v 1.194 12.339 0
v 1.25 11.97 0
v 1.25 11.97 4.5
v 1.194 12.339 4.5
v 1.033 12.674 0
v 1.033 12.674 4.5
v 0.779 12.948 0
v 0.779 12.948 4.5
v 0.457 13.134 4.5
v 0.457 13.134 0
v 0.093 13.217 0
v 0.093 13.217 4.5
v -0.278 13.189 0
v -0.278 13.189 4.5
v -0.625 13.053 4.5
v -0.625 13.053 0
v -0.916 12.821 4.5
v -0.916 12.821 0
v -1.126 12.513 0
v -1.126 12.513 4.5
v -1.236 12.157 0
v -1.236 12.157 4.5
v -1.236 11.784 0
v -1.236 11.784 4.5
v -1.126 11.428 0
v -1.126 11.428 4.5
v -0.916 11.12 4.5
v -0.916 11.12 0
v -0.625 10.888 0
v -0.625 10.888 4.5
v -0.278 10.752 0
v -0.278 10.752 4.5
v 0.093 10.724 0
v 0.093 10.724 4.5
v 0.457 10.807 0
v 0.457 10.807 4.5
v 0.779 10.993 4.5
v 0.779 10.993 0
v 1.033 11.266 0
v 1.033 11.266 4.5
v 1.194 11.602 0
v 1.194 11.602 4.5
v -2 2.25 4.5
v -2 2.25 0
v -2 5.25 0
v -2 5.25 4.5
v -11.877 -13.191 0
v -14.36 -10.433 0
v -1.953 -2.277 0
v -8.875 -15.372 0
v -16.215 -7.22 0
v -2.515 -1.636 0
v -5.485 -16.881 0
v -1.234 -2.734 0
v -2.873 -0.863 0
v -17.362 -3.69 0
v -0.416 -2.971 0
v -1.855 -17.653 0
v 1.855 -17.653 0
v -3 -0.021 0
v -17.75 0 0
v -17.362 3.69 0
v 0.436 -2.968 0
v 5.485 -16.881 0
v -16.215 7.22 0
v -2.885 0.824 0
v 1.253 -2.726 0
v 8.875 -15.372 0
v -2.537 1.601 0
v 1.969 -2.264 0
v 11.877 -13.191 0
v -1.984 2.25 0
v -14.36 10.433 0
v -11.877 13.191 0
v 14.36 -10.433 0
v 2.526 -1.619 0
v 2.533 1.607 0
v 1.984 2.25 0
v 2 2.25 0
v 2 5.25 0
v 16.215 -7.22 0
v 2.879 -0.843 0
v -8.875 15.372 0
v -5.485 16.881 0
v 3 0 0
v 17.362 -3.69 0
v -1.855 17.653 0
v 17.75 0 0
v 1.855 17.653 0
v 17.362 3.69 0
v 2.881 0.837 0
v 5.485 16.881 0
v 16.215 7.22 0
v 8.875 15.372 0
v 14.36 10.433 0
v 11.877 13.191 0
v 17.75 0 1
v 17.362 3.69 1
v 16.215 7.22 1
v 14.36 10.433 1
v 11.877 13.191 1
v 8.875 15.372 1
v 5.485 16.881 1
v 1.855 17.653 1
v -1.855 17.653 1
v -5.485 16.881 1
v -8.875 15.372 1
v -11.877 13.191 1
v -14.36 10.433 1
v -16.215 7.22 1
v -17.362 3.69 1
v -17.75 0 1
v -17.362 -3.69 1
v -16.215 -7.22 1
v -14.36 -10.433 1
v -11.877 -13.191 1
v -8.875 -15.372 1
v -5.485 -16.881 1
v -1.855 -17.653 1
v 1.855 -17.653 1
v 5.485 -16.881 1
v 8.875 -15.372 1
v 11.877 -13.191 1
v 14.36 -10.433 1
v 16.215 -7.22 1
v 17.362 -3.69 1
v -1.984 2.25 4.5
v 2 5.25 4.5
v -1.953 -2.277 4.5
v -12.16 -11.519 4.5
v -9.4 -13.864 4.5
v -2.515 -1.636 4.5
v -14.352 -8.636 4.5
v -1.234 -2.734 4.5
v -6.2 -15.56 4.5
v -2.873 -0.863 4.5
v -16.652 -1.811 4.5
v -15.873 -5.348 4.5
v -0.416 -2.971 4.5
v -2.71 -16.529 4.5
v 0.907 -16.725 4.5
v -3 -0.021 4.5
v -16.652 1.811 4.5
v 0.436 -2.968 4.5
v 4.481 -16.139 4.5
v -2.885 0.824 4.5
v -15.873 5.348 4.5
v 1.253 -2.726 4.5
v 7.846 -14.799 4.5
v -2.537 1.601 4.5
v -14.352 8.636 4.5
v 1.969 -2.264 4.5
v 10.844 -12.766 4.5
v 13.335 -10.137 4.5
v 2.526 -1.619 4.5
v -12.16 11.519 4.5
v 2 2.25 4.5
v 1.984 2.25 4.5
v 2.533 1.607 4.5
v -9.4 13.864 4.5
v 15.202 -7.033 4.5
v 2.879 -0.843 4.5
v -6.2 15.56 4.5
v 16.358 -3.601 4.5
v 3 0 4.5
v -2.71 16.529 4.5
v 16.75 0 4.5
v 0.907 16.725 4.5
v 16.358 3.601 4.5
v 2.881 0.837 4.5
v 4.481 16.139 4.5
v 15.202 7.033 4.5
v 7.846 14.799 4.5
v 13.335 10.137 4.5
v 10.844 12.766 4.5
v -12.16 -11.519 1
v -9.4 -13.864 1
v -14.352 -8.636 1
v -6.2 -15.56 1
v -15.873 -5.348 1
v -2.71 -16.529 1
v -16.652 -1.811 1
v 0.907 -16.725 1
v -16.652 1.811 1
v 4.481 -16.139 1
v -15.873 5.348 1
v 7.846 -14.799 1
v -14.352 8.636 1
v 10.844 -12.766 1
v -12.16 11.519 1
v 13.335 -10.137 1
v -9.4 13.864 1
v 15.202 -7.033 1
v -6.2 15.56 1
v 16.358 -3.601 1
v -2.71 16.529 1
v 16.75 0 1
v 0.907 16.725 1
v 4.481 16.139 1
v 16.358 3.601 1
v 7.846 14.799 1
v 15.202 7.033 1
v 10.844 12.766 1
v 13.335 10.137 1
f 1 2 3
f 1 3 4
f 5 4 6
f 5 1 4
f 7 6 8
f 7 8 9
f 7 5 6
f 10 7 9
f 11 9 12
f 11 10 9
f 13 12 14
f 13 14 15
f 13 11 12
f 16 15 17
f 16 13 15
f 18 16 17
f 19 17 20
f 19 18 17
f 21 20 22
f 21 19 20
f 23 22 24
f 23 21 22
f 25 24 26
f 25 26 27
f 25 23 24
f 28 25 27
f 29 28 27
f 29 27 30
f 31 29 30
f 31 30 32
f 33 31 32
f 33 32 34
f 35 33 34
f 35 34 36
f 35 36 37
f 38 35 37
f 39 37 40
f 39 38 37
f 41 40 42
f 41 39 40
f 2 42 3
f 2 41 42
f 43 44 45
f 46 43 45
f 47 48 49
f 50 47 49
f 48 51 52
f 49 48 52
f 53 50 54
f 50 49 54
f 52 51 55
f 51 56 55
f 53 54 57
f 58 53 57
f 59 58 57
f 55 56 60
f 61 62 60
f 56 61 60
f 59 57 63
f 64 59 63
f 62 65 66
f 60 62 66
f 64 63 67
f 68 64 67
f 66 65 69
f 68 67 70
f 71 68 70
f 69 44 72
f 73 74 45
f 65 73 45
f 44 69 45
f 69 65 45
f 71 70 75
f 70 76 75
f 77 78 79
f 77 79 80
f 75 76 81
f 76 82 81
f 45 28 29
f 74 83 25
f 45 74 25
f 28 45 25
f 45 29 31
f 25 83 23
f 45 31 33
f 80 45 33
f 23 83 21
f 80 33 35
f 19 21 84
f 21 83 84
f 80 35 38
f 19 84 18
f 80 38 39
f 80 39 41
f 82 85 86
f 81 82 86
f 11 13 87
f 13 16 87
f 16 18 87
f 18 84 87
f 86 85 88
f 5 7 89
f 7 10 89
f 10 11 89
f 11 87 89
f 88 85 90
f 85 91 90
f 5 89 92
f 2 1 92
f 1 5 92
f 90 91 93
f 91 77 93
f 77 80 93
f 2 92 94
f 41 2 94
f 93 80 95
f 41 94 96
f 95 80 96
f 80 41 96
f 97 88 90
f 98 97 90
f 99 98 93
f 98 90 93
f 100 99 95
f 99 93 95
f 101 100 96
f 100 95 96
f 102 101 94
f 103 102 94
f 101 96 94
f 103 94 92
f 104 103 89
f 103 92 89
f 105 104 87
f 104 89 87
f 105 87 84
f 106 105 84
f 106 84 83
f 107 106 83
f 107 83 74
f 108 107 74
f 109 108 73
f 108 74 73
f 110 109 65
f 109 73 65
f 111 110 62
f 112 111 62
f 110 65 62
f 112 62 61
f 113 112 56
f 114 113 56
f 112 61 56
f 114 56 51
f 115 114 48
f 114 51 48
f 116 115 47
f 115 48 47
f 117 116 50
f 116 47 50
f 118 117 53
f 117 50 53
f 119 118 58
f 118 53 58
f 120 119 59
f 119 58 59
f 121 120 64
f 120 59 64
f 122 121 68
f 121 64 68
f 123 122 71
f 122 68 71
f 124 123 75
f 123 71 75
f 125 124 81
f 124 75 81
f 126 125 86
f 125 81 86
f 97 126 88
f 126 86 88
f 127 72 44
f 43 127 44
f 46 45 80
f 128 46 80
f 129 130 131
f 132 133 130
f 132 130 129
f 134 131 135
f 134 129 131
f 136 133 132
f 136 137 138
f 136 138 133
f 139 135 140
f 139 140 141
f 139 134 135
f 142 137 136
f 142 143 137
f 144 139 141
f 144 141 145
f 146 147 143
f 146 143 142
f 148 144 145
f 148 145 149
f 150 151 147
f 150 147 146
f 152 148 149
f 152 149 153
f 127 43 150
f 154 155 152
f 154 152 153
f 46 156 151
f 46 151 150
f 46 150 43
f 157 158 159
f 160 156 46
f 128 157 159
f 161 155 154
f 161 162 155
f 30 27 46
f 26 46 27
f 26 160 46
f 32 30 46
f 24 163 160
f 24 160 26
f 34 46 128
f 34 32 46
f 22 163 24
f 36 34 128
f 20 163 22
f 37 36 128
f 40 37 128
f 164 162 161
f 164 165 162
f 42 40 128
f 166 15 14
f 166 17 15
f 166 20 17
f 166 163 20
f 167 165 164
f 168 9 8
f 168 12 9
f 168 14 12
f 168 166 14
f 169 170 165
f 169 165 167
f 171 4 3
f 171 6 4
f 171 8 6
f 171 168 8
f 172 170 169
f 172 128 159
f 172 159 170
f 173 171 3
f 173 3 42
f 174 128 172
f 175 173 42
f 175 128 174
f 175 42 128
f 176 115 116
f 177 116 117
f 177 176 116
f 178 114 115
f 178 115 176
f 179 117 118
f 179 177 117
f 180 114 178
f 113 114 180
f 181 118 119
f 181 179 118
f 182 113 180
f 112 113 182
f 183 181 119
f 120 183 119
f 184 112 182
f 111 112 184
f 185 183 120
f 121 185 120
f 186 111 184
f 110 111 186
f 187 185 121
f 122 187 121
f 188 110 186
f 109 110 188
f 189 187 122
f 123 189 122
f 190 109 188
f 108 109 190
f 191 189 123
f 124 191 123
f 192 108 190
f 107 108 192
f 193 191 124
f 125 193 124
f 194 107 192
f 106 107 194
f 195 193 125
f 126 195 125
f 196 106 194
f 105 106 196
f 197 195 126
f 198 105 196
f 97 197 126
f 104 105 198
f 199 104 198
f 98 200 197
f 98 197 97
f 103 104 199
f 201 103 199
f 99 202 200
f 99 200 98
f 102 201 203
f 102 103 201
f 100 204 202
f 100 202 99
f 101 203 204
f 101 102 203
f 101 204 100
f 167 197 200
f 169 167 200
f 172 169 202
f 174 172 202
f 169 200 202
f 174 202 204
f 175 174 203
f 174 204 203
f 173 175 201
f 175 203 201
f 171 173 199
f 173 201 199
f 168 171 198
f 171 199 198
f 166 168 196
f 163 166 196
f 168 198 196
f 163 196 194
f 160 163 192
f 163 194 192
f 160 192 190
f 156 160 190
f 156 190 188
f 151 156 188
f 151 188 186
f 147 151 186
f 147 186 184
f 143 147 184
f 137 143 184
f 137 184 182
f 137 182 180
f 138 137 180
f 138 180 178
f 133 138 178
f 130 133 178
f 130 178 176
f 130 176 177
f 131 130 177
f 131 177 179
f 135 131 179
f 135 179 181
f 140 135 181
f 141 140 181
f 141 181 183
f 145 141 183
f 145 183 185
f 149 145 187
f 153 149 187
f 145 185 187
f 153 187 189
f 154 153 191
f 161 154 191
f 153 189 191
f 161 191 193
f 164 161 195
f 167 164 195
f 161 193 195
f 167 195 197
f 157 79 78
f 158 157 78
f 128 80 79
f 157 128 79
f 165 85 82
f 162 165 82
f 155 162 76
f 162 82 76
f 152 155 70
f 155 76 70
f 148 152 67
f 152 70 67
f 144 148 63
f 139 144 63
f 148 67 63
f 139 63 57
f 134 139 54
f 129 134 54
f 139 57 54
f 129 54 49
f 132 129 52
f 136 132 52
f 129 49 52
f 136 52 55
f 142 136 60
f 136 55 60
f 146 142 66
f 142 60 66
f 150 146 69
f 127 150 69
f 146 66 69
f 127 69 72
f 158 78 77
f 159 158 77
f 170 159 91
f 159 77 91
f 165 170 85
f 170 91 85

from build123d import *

# Parameters (mm, degrees)
F0_R     = 16.75
F0_R_2   = 1.25
F1_DEPTH = 4.5
F0_R_3   = 17.75
F2_DEPTH = 1


# Not quite as in the source:
# - a feature names something its author has since deleted; it is built from what else it names


with BuildPart() as f1:
    # F0 (on Top) → F1 (new body)
    with BuildSketch(Plane.XY):
        Circle(F0_R)
        with BuildLine():
            ThreePointArc((1.9843134833, 2.25), (2.7343134833, 1.2343134833), (3, 0))
            ThreePointArc((3, 0), (-1.2343134833, -2.7343134833), (-1.9843134833, 2.25))
            Line((-1.9843134833, 2.25), (-2, 2.25))
            Line((-2, 2.25), (-2, 5.25))
            Line((-2, 5.25), (2, 5.25))
            Line((2, 5.25), (2, 2.25))
            Line((2, 2.25), (1.9843134833, 2.25))
        make_face(mode=Mode.SUBTRACT)
        with Locations((0, 11.9703095406)):
            Circle(F0_R_2, mode=Mode.SUBTRACT)
    extrude(amount=F1_DEPTH)

    # F0 (on Top) → F2 (join)
    with BuildSketch(Plane.XY):
        Circle(F0_R_3)
        Circle(F0_R, mode=Mode.SUBTRACT)
    extrude(amount=F2_DEPTH)


solid = f1.part
